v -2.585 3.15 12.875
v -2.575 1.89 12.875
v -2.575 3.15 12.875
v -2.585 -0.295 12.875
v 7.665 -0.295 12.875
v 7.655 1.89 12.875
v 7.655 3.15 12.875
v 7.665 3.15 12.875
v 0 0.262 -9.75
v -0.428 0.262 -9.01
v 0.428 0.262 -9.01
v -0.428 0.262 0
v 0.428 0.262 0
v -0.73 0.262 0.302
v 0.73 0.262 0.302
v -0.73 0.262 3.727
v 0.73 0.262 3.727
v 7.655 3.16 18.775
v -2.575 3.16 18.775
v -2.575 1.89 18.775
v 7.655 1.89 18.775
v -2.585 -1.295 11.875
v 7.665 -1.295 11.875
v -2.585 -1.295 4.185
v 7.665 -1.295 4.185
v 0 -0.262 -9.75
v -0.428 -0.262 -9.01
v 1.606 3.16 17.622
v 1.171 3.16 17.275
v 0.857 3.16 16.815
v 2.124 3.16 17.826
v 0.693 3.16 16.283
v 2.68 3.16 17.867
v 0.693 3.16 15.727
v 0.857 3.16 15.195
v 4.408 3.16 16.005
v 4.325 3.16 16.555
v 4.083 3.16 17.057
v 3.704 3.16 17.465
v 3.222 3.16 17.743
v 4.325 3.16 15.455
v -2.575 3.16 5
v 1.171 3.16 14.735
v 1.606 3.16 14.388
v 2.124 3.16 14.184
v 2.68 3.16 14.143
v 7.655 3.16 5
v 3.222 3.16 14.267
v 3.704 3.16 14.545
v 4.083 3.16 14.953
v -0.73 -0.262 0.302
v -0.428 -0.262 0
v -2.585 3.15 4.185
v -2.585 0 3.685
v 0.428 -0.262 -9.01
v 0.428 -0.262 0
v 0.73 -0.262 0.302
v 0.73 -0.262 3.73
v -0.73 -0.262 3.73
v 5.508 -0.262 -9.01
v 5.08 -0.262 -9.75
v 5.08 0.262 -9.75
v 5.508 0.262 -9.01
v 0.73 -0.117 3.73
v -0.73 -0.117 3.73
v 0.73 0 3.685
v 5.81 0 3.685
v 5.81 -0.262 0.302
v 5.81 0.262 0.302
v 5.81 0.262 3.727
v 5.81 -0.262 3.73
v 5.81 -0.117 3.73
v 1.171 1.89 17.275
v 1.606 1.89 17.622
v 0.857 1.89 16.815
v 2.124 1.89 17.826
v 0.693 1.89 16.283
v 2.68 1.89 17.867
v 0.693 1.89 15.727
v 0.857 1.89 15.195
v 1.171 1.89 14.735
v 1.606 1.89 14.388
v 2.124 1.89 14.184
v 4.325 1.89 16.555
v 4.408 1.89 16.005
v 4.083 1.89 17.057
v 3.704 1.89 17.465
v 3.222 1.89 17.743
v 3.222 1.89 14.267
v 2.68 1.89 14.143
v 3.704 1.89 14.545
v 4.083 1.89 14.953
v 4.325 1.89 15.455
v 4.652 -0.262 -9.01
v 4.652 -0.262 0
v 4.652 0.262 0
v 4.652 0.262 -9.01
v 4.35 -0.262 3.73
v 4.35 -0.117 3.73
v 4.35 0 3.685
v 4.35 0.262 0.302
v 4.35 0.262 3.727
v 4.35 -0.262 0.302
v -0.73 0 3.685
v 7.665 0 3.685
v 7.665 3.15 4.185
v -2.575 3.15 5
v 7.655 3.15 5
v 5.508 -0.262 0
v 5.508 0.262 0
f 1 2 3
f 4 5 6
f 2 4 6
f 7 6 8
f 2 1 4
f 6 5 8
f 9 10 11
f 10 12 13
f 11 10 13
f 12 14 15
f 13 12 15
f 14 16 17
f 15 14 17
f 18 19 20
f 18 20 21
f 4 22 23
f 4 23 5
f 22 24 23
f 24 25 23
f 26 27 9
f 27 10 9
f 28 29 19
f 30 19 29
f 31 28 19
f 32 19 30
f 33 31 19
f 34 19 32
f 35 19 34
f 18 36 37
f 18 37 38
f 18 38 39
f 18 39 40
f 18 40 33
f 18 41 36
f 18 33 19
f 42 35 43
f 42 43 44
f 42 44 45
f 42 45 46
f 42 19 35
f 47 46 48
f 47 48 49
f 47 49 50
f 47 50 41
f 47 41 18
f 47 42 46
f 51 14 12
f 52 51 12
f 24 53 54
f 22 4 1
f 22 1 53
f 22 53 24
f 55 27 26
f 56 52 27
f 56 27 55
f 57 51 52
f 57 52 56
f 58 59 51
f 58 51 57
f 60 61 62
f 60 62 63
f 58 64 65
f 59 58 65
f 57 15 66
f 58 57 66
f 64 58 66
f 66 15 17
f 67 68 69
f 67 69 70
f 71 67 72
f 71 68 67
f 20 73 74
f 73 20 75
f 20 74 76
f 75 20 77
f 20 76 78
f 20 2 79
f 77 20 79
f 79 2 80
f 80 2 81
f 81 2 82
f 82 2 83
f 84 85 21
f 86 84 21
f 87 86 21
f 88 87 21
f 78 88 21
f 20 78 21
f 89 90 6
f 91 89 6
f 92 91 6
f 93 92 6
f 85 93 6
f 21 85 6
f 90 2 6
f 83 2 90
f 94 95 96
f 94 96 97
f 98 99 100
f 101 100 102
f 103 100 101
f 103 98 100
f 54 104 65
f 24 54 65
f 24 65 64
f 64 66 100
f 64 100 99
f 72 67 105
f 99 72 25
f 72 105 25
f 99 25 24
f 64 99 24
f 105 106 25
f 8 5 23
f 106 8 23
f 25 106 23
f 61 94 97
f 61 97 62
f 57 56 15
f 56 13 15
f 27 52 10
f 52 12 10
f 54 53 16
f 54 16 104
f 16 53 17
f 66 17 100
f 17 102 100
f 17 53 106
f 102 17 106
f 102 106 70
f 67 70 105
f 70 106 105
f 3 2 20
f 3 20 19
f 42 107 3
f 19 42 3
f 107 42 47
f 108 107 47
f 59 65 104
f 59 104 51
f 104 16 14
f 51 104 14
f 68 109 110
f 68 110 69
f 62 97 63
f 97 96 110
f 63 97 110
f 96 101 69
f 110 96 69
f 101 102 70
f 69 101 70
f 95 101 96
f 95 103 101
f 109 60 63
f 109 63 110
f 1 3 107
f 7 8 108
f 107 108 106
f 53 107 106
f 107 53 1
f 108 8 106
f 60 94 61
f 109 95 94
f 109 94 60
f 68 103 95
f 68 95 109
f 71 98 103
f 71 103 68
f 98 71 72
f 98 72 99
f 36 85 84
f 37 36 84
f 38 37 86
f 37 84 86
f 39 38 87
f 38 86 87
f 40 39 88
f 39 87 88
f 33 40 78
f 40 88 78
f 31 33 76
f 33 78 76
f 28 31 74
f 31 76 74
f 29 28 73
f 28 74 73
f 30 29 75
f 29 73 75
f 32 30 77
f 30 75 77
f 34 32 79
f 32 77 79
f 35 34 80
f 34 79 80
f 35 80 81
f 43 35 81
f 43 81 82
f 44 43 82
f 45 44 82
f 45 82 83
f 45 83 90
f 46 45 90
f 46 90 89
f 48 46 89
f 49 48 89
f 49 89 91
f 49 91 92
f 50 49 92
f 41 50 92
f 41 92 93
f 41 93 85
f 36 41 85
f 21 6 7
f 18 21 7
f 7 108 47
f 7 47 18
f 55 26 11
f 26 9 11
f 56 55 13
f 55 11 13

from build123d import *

# Parameters (mm, degrees)
SKETCH004_W  = 10.23
SKETCH004_H  = 1.27
PAD002_DEPTH = 13.775
SKETCH005_R  = 1.8675
POCKET_DEPTH = 1.271
PAD_DEPTH    = 0.2625
PAD001_DEPTH = 5.125


with BuildPart() as pocket:
    # Sketch004 → Pad002 (new body)
    with BuildSketch(Plane.XY.offset(5)):
        with Locations((2.54, 2.525)):
            Rectangle(SKETCH004_W, SKETCH004_H)
    extrude(amount=PAD002_DEPTH)

    # Sketch005 → Pocket (cut, through all)
    with BuildSketch(Plane(origin=(0, 1.89, 5), x_dir=(1, 0, 0), z_dir=(0, -1, 0))):
        with Locations((2.54, 11.005)):
            Circle(SKETCH005_R)
    extrude(amount=-POCKET_DEPTH, mode=Mode.SUBTRACT)


with BuildPart() as pad:
    # Sketch → Pad (new body, symmetric)
    with BuildSketch(Plane.XZ):
        Polygon((-0.73, 0.3025), (-0.4275, 0), (-0.4275, -9.009548), (0, -9.75), (0.4275, -9.009548), (0.4275, 0), (0.73, 0.3025), (0.73, 3.73), (-0.73, 3.73), align=None)
        Polygon((4.35, 0.3025), (4.6525, 0), (4.6525, -9.009548), (5.08, -9.75), (5.5075, -9.009548), (5.5075, 0), (5.81, 0.3025), (5.81, 3.73), (4.35, 3.73), align=None)
    extrude(amount=PAD_DEPTH, both=True)


with BuildPart() as to_220_2_vertical:
    # Sketch001 → Pad001 (new body, symmetric)
    with BuildSketch(Plane.YZ.offset(2.54)):
        Polygon((0, 3.685), (-1.295, 4.185), (-1.295, 11.875), (-0.295, 12.875), (3.15, 12.875), (3.15, 4.185), align=None)
    extrude(amount=PAD001_DEPTH, both=True)

    # Pad001_mp_cp: union Pocket, Pad
    add(pocket.part)
    add(pad.part)


solid = to_220_2_vertical.part
